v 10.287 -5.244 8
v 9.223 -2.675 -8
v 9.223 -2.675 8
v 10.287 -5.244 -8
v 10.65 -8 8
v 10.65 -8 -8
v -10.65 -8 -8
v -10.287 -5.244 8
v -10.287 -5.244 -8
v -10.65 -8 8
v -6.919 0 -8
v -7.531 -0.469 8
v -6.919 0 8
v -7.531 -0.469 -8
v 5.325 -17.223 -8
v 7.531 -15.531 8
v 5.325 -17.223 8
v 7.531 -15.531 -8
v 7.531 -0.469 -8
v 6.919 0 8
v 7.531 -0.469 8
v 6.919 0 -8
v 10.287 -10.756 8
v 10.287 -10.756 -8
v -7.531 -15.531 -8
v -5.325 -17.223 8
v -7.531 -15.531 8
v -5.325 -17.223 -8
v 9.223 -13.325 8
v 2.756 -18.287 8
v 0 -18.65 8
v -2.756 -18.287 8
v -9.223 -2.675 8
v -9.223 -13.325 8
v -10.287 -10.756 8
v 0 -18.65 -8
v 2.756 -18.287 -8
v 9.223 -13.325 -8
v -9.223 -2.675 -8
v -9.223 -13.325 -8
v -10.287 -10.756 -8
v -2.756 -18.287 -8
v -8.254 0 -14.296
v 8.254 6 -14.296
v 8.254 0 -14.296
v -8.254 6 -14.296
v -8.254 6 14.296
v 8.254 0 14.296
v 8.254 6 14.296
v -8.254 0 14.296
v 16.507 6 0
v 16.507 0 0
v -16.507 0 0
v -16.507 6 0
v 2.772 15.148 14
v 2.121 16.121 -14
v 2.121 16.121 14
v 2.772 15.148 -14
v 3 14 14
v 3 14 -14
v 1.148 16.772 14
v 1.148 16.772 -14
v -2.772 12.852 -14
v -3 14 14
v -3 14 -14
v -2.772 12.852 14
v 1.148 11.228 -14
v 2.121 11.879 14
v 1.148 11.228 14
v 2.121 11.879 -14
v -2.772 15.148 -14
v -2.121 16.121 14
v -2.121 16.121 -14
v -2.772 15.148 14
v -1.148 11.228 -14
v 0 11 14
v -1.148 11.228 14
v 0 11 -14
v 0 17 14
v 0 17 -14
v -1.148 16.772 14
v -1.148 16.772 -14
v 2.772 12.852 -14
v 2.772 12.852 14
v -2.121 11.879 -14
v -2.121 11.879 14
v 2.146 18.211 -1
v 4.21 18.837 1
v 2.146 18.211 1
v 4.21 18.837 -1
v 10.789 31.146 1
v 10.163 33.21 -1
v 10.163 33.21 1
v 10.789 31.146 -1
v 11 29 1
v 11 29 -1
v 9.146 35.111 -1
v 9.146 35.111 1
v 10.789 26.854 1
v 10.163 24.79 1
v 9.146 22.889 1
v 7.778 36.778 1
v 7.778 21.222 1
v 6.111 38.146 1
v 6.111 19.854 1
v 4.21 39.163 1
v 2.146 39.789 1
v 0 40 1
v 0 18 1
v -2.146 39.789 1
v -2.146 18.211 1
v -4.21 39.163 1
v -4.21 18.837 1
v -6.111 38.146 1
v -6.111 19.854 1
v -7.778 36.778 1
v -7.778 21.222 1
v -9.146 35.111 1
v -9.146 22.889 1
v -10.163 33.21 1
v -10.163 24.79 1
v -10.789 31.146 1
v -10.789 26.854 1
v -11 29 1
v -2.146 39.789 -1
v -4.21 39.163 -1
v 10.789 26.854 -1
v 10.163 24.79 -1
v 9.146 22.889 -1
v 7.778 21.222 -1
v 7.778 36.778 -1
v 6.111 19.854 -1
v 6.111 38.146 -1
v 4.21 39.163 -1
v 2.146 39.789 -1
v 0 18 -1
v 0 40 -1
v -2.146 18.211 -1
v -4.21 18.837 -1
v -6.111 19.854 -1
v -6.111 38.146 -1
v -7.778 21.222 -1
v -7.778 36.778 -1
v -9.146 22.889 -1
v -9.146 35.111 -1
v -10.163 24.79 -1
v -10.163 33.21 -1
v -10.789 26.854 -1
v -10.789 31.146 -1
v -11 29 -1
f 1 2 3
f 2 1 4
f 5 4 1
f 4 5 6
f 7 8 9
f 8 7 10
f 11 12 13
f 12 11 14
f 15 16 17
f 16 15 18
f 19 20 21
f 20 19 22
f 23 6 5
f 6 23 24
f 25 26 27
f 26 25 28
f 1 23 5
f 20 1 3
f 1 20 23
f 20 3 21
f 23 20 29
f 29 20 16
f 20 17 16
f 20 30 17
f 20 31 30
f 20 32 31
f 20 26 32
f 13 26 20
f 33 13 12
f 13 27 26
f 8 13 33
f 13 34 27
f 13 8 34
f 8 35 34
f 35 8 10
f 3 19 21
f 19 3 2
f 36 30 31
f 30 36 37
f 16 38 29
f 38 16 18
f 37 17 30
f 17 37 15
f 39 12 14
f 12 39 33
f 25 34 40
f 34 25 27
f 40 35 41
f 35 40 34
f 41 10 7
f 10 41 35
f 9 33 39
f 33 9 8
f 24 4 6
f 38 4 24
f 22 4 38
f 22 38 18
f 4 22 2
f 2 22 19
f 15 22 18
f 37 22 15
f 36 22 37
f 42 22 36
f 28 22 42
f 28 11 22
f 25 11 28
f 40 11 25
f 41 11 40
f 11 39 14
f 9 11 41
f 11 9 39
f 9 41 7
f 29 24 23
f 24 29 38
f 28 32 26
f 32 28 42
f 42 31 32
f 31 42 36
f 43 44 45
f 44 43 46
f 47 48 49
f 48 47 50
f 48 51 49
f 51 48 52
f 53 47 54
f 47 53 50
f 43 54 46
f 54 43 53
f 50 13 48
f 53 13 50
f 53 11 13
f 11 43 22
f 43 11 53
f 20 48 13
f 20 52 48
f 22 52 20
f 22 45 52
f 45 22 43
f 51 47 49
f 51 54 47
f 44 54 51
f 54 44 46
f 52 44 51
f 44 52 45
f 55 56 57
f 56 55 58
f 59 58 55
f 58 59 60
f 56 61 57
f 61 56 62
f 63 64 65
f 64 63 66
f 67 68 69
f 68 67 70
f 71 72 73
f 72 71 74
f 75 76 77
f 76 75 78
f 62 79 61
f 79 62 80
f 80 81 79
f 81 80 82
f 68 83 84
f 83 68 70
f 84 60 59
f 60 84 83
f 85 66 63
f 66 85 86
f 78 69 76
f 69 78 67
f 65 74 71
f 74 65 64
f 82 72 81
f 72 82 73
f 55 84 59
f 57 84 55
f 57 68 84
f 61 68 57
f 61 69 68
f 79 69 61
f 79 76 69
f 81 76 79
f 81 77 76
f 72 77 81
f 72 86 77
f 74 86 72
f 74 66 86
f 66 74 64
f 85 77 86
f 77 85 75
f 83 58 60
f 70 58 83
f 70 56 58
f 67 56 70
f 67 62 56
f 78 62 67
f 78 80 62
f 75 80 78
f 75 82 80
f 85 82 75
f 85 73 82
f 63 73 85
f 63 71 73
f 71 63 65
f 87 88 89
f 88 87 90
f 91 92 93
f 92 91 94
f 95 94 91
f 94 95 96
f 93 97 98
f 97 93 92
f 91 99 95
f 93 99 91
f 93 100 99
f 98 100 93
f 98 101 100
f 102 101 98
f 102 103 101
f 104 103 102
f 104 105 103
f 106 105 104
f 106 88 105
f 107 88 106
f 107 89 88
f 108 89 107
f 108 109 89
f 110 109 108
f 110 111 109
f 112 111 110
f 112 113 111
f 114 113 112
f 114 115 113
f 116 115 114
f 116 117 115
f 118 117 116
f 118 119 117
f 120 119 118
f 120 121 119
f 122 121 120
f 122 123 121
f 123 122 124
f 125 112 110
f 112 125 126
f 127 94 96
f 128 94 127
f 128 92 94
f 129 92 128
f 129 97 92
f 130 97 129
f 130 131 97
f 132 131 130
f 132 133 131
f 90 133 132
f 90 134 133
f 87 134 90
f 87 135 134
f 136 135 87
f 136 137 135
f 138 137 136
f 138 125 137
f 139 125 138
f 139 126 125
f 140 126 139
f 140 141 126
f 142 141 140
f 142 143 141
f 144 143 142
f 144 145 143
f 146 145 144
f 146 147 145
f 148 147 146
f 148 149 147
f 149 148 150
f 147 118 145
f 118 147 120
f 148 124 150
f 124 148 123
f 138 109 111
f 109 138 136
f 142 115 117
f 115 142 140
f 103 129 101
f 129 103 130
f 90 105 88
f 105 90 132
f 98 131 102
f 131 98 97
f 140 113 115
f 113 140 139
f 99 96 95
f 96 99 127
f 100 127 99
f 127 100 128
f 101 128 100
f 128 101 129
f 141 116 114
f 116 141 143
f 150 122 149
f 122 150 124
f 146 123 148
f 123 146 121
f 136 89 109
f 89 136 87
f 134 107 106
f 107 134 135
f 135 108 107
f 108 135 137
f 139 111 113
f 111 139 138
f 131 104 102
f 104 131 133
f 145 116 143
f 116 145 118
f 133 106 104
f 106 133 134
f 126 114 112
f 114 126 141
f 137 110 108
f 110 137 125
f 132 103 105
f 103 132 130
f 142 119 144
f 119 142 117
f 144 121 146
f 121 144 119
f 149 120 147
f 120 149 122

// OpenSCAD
// Upright sprinkler head. Thread down (-Y), deflector above origin.
//
//   inlet: (0, -L/2, 0), dir (0, -1, 0)
//
// @part head_upright
// @kind sprinkler_head
// @category head.pendant.k56
// @display-name "Upright Sprinkler K5.6 (1/2\" NPT)"
// @mfg tyco
// @mfg-pn TY3131
// @listing UL FM
// @hazard-classes LH OH1 OH2
// @price-usd 23.00
// @install-minutes 5
// @crew journeyman
// @k-factor 5.6
// @orientation upright
// @response standard
// @temperature 155F
// @param size_in enum[0.5,0.75] default=0.5 label="Size" unit="in"
// @param k_factor enum[5.6,8.0] default=5.6 label="K-Factor"
// @port inlet position=[0,-0.014,0] direction=[0,-1,0] style=NPT_threaded size_in=0.5 role=drop

thread_od    = 21.3;
thread_len   = 16;
frame_height = 28;
deflector_d  = 22;

union() {
    translate([0, -thread_len/2, 0])
        cylinder(h = thread_len, d = thread_od, center = true, $fn = 24);
    translate([0, 3, 0])
        rotate([90, 0, 0])
        cylinder(h = 6, d = thread_od * 1.55, $fn = 6, center = true);
    translate([0, frame_height/2, 0])
        cylinder(h = frame_height, d = 6, center = true, $fn = 16);
    translate([0, frame_height + 1, 0])
        cylinder(h = 2, d = deflector_d, center = true, $fn = 32);
}
